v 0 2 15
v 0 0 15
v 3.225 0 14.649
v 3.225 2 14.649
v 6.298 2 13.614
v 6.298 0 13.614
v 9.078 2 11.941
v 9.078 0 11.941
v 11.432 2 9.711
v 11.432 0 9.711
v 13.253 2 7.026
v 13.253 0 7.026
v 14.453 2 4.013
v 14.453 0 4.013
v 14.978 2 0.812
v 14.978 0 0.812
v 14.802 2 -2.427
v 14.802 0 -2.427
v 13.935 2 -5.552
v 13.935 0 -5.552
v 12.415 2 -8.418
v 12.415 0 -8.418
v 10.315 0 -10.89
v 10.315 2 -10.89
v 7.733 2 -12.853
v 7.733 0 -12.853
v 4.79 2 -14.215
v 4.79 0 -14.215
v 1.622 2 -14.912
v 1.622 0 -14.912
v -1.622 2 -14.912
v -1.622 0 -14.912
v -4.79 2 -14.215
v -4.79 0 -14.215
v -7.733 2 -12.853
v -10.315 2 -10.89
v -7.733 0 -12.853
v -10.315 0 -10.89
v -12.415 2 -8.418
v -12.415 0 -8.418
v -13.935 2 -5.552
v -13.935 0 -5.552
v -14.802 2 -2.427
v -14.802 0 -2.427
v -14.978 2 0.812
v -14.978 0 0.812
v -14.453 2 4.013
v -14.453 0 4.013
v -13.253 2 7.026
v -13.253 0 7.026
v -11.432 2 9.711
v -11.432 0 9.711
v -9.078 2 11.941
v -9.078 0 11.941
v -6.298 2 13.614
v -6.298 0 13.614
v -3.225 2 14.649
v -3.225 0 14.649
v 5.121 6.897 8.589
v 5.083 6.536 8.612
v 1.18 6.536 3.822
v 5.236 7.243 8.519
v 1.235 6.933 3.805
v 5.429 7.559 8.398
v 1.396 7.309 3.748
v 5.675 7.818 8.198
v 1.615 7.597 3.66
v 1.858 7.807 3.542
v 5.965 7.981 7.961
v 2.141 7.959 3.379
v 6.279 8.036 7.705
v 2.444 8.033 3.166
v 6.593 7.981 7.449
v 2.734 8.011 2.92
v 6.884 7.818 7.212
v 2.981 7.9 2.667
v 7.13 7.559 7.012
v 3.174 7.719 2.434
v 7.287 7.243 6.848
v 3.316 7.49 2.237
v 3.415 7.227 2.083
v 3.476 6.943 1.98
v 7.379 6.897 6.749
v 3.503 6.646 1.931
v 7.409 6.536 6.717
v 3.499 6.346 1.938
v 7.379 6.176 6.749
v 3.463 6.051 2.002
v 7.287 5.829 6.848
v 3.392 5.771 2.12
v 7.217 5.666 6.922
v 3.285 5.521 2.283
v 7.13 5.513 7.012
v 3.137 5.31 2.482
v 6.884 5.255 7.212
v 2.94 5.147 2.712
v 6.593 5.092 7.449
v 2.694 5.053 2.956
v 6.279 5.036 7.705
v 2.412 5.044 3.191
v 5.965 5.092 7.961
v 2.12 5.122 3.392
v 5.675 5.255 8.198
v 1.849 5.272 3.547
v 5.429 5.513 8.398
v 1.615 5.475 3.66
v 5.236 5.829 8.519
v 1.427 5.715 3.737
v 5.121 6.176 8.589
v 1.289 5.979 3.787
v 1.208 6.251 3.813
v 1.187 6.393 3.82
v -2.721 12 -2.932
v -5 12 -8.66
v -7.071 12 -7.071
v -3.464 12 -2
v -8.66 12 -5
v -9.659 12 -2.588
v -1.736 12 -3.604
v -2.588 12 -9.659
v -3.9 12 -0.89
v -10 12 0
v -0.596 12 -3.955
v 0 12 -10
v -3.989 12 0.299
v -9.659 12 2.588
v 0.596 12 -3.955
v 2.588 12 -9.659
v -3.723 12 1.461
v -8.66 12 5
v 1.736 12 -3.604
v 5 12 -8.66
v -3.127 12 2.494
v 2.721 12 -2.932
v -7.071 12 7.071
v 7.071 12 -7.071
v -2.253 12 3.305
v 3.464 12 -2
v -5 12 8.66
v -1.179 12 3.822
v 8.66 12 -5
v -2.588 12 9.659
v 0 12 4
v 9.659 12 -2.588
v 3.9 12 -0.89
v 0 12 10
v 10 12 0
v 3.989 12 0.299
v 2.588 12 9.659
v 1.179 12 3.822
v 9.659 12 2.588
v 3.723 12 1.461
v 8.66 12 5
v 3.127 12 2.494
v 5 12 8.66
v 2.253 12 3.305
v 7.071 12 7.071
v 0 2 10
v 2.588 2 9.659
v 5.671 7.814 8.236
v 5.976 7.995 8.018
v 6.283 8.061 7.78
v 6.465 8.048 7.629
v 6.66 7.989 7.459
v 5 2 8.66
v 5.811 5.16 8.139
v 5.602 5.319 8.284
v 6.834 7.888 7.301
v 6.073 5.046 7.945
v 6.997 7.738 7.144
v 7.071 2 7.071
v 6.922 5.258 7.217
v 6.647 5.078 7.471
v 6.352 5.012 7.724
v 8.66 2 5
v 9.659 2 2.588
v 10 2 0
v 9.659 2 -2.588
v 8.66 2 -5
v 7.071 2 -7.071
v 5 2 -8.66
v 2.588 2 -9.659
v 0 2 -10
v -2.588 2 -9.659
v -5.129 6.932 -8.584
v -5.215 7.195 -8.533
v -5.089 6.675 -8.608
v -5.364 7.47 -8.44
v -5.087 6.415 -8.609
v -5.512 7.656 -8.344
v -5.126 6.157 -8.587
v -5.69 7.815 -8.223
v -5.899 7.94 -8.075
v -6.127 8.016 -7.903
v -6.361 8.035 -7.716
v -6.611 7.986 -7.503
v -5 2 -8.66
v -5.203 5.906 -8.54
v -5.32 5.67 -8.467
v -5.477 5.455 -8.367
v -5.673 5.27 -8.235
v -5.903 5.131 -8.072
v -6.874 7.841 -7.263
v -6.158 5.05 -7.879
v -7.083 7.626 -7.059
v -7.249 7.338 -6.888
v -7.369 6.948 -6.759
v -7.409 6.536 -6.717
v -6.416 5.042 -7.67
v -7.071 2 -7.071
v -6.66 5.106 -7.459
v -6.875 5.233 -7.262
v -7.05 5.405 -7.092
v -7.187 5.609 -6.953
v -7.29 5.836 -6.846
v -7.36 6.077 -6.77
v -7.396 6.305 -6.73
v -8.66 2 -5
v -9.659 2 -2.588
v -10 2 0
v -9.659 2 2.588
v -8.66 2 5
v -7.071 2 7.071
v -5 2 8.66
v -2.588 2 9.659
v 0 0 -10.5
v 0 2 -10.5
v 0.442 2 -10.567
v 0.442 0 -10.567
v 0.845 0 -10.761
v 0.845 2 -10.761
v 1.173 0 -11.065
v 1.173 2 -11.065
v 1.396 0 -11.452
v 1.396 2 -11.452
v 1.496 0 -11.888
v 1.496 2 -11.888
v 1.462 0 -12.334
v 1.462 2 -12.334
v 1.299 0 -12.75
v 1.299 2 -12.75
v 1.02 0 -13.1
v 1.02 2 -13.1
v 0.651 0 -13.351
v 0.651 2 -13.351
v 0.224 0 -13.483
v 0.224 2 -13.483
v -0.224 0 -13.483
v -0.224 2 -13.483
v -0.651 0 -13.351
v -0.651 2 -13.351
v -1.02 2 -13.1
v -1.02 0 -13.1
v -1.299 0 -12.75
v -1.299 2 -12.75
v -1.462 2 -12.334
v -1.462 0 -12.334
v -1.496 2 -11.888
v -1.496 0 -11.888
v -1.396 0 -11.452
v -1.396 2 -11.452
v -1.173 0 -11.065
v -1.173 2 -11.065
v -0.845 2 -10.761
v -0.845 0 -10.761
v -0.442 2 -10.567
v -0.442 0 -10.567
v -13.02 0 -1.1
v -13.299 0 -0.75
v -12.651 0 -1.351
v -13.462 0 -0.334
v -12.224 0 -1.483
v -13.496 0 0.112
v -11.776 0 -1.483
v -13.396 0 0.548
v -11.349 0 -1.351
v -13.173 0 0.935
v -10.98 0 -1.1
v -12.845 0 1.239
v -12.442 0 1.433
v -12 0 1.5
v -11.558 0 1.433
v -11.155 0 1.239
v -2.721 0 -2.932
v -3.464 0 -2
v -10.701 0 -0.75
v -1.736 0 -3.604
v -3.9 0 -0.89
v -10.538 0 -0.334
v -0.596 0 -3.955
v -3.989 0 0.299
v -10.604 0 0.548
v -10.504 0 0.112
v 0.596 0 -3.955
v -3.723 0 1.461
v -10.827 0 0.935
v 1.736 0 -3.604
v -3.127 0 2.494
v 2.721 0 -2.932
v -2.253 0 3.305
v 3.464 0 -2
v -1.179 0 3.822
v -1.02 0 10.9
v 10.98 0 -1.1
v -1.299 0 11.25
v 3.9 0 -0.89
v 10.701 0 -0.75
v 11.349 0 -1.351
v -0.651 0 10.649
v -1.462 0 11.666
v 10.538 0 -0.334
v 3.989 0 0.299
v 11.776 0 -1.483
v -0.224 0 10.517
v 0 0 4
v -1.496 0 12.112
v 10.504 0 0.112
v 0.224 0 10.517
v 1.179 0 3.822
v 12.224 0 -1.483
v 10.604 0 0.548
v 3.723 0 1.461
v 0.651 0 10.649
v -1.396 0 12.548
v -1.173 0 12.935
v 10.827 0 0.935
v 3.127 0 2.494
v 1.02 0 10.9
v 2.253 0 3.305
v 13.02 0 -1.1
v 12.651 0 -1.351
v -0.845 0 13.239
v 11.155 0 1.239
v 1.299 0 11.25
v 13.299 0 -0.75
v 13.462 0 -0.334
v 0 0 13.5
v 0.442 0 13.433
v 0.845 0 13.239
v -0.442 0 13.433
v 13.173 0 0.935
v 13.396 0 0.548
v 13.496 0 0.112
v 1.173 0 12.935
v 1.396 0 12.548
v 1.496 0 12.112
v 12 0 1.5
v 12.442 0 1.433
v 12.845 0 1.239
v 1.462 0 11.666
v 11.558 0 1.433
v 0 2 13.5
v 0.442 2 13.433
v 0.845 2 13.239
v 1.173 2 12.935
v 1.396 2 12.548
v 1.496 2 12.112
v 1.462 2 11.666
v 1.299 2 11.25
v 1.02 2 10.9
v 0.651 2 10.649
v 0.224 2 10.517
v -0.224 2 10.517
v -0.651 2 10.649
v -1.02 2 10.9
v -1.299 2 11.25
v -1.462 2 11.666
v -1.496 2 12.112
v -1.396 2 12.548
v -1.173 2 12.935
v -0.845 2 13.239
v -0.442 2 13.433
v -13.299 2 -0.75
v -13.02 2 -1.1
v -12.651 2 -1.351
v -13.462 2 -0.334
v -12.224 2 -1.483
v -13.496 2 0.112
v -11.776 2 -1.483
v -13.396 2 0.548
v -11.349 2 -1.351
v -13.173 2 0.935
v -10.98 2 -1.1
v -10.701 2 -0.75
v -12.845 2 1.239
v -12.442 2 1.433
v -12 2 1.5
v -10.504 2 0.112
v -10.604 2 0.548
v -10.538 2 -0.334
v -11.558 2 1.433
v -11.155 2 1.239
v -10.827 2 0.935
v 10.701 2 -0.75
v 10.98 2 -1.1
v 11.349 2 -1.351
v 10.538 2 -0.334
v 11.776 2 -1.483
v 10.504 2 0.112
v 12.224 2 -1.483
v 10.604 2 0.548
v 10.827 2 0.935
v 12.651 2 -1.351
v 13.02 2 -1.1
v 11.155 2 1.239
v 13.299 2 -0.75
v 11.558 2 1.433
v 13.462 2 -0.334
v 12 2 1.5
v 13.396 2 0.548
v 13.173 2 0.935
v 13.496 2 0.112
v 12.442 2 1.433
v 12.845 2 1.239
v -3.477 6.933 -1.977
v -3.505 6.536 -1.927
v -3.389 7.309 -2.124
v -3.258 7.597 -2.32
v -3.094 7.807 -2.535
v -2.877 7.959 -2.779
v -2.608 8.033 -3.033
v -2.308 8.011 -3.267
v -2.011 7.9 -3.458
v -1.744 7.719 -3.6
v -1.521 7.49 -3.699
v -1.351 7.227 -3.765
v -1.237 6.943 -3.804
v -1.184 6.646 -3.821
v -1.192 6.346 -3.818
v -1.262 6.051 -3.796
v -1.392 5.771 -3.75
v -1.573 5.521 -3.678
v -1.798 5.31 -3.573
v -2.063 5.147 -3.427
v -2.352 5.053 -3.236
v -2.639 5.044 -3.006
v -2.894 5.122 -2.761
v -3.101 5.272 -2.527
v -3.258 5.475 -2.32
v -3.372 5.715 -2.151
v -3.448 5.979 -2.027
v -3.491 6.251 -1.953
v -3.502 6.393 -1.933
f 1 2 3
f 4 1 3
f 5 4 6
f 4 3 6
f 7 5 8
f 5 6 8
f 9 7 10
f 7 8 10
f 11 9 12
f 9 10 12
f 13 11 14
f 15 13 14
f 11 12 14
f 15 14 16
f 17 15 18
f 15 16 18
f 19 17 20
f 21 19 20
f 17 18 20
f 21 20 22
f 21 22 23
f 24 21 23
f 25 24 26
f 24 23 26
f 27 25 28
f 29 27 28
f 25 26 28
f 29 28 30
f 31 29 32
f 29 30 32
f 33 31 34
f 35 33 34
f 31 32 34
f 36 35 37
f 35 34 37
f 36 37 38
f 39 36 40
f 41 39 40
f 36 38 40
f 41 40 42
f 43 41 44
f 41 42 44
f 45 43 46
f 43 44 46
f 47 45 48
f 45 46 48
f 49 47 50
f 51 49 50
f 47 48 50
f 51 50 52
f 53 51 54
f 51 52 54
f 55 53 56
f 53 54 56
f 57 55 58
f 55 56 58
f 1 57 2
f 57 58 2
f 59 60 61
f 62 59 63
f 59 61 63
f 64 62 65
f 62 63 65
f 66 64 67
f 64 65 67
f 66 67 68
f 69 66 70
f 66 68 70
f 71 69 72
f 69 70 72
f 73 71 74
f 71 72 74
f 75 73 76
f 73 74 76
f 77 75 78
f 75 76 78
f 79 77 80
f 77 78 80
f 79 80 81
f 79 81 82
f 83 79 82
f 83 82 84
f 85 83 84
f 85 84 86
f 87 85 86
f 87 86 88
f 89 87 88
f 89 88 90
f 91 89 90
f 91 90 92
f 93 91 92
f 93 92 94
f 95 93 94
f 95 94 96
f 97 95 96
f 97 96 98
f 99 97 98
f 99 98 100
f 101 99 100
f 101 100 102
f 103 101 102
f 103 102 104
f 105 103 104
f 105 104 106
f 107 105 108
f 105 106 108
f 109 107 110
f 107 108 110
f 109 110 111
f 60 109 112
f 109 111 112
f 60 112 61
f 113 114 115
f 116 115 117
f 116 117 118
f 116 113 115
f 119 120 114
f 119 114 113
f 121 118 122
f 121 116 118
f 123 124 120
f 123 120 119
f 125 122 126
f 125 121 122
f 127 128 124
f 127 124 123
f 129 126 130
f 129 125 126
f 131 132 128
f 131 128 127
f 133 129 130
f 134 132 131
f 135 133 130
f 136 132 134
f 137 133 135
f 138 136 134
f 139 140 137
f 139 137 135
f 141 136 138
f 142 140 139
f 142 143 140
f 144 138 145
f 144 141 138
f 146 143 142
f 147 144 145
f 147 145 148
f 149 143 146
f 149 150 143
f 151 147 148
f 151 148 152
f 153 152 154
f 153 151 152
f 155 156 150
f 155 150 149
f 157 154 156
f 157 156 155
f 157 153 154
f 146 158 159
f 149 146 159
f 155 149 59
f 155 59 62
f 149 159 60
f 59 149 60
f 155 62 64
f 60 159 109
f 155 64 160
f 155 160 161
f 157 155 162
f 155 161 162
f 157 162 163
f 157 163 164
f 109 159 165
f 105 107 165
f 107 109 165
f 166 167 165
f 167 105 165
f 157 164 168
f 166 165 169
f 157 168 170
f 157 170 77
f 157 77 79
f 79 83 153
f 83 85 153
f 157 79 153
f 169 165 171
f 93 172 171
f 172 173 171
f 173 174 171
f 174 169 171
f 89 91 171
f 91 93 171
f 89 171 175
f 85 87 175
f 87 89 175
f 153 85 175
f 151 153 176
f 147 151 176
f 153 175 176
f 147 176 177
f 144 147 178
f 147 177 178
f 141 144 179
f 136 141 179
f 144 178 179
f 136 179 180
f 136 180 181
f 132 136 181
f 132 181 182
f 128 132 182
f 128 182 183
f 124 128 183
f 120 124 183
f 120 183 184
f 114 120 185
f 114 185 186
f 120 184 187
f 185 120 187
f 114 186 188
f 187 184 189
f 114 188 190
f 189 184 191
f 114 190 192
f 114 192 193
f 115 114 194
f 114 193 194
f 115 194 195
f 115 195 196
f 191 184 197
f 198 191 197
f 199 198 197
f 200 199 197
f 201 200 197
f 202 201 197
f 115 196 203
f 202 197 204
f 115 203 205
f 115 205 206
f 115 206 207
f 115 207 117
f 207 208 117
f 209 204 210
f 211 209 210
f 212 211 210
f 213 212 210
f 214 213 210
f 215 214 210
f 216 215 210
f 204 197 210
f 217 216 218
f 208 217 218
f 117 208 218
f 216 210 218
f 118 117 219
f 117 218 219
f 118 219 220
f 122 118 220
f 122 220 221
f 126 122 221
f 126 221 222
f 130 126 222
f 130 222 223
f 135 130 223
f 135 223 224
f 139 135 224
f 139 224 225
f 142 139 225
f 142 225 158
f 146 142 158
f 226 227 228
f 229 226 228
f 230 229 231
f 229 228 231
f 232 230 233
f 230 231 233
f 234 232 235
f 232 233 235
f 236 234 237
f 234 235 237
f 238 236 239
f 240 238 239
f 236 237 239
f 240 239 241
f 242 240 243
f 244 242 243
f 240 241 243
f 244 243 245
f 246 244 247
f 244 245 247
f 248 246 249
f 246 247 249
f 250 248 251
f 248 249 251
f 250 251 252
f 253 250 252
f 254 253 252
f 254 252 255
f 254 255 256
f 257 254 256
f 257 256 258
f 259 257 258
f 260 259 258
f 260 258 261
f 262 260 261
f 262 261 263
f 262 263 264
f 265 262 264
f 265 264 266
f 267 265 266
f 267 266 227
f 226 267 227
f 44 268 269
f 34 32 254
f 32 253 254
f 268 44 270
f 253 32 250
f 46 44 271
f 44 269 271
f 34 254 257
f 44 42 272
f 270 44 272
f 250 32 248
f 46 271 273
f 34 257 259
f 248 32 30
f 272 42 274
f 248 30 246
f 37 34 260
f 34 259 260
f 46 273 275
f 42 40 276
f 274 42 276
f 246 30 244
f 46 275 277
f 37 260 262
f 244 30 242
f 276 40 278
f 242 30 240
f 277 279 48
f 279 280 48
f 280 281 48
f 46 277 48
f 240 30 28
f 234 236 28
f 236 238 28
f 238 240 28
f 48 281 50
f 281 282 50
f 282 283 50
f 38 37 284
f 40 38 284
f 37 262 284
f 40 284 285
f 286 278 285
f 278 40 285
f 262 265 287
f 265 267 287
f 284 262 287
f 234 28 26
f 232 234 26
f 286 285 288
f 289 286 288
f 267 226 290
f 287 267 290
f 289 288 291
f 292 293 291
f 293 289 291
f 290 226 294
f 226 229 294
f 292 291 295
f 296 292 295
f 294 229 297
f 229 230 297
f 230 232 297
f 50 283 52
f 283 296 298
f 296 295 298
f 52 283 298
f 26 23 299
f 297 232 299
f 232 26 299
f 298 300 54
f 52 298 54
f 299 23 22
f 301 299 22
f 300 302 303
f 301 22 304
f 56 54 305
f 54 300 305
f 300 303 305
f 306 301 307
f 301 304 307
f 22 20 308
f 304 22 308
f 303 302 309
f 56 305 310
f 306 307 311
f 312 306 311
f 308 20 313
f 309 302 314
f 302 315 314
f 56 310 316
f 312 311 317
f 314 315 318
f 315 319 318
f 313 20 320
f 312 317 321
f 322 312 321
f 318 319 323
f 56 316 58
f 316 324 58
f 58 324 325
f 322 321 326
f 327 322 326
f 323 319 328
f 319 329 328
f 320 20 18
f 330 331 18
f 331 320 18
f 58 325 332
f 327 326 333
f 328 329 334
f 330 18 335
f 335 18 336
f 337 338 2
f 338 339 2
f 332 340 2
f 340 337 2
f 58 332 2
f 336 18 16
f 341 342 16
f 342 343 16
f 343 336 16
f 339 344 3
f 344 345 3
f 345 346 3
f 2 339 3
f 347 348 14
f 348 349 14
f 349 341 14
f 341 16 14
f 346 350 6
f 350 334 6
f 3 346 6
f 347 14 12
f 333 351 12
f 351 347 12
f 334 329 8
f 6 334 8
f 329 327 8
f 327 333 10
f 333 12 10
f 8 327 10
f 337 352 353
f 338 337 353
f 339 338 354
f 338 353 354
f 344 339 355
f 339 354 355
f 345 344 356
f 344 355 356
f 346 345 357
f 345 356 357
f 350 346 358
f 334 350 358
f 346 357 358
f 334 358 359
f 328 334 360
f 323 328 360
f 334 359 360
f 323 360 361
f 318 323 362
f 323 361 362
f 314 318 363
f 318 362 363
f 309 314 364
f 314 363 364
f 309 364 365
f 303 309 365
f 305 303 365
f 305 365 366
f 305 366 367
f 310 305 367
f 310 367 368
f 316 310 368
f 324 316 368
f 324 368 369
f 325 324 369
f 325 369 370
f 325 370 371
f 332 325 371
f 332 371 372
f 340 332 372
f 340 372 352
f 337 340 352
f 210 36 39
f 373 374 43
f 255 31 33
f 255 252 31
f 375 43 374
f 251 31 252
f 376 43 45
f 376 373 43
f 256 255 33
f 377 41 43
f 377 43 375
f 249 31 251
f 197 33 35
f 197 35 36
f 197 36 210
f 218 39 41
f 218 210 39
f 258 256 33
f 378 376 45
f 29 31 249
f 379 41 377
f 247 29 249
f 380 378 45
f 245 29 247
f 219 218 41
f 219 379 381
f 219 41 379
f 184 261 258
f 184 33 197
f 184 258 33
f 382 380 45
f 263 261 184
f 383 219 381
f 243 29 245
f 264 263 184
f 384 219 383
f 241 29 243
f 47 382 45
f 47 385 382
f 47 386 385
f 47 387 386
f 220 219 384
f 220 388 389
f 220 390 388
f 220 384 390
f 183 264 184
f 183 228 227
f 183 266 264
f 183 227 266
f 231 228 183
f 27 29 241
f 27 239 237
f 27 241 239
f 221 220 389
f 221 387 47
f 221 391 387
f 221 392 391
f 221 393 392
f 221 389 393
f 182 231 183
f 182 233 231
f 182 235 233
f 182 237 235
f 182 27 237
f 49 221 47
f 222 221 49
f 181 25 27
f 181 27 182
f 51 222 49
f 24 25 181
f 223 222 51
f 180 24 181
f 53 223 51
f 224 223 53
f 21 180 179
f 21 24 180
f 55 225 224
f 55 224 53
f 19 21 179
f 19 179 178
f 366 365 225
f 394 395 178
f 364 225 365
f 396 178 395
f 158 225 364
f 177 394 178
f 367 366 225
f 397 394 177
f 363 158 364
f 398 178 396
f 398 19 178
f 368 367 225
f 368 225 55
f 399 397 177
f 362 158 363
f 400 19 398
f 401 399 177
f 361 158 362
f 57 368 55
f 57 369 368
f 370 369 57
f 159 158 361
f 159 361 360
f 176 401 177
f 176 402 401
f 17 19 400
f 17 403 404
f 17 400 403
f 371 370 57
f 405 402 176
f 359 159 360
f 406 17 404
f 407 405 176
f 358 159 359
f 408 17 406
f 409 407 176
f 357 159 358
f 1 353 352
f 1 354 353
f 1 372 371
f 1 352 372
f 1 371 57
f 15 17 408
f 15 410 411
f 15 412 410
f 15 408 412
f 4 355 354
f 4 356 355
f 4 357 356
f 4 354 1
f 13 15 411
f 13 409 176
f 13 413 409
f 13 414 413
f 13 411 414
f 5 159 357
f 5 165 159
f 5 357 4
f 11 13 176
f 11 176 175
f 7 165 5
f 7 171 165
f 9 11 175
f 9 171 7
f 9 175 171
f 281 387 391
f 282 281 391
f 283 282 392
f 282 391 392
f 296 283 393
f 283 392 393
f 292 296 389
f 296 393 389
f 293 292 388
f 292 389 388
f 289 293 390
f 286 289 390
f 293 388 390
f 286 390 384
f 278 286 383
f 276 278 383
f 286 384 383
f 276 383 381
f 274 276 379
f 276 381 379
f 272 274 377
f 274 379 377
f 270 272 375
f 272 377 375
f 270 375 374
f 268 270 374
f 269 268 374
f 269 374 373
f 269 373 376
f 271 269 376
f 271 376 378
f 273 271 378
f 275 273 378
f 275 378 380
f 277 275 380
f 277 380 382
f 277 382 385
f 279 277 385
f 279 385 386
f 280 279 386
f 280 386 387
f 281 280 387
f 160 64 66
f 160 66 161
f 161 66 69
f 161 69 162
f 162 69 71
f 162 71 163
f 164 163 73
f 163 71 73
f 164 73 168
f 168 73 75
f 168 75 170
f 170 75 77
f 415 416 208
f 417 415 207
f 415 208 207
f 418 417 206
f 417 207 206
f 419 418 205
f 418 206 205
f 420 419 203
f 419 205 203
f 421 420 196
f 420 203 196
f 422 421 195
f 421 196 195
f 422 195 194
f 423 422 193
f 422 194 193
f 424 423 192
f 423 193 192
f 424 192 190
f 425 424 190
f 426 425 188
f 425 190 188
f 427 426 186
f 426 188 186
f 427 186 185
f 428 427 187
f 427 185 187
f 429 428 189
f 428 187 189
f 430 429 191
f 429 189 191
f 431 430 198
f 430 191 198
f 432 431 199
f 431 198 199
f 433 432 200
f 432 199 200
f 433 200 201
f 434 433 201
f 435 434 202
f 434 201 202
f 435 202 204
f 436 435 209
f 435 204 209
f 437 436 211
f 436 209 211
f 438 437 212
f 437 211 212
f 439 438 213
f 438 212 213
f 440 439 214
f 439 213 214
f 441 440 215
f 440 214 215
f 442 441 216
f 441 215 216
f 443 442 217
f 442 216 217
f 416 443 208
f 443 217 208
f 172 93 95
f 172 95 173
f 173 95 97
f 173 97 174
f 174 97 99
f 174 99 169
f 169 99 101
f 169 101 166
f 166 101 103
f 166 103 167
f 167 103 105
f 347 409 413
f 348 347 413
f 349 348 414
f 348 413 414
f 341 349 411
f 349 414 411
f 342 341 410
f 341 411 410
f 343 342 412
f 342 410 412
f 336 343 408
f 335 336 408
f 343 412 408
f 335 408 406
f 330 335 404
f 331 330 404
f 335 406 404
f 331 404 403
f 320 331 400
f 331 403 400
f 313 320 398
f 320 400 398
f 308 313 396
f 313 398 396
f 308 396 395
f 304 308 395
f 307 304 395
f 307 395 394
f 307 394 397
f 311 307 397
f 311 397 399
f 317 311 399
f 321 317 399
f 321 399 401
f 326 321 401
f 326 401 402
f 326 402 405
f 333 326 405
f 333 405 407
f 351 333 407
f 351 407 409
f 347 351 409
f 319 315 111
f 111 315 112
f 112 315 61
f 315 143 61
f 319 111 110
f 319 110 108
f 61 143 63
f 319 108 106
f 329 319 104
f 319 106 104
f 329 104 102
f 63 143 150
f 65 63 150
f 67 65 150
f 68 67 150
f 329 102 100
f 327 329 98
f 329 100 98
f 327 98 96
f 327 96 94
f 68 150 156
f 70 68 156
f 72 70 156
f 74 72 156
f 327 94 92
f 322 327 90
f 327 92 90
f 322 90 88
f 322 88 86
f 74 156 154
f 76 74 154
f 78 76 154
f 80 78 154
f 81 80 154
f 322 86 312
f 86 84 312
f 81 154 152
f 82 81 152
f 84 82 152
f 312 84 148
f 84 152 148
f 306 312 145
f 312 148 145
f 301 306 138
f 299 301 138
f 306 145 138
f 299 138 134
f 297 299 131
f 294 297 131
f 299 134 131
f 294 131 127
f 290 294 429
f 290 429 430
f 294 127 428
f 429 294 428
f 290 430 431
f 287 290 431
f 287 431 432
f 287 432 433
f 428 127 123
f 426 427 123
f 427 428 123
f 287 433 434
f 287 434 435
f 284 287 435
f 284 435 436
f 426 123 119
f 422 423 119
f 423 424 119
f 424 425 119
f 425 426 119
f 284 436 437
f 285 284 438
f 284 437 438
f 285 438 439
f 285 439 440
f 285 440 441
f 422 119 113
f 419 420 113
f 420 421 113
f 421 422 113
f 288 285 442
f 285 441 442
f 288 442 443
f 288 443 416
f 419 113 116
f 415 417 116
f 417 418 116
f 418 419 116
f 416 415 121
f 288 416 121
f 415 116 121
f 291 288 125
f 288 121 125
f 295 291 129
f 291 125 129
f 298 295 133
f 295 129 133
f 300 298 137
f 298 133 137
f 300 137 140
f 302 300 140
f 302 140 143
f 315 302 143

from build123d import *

# Parameters (mm, degrees)
SKETCH1_R                          = 15
BOSS_EXTRUDE1_DEPTH                = 2
SKETCH2_R                          = 10
BOSS_EXTRUDE2_DEPTH                = 10
SKETCH3_R                          = 4
CUT_EXTRUDE1_DEPTH                 = 25.372115214
SKETCH4_R                          = 1.5
CUT_EXTRUDE2_DEPTH                 = 10
F_3_0_3_DIAMETER_HOLE2_D           = 3
F_3_0_3_DIAMETER_HOLE2_CSINK_D     = 3.05
F_3_0_3_DIAMETER_HOLE2_CSINK_ANGLE = 45


with BuildPart() as part:
    # Sketch1 → Boss-Extrude1 (new body)
    with BuildSketch(Plane(origin=(0, 0, 0), x_dir=(1, 0, 0), z_dir=(0, 1, 0))):
        with Locations(Location((0, 0, 0), (0, 0, 270))):
            Circle(SKETCH1_R)
    extrude(amount=BOSS_EXTRUDE1_DEPTH)

    # Sketch2 → Boss-Extrude2 (add)
    with BuildSketch(Plane(origin=(0, 2, 0), x_dir=(1, 0, 0), z_dir=(0, 1, 0))):
        with Locations(Location((0, 0, 0), (0, 0, 270))):
            Circle(SKETCH2_R)
    extrude(amount=BOSS_EXTRUDE2_DEPTH)

    # Sketch3 → Cut-Extrude1 (cut, through all)
    with BuildSketch(Plane(origin=(0, 12, 0), x_dir=(1, 0, 0), z_dir=(0, 1, 0))):
        with Locations(Location((0, 0, 0), (0, 0, 270))):
            Circle(SKETCH3_R)
    extrude(amount=-CUT_EXTRUDE1_DEPTH, mode=Mode.SUBTRACT)

    # Sketch4 → Cut-Extrude2 (cut)
    with BuildSketch(Plane(origin=(0, 2, 0), x_dir=(1, 0, 0), z_dir=(0, 1, 0))):
        with Locations(Location((-12, 0, 0), (0, 0, 270))):
            Circle(SKETCH4_R)
        with Locations(Location((0, 12, 0), (0, 0, 270))):
            Circle(SKETCH4_R)
        with Locations(Location((12, 0, 0), (0, 0, 270))):
            Circle(SKETCH4_R)
        with Locations(Location((0, -12, 0), (0, 0, 270))):
            Circle(SKETCH4_R)
    extrude(amount=-CUT_EXTRUDE2_DEPTH, mode=Mode.SUBTRACT)

    # Ø3.0 (3) Diameter Hole2 (through all)
    with Locations(Plane(origin=(6.317328185, 6.536355403, 7.751862009), x_dir=(0.775186200902, 0, -0.631732818469), z_dir=(0.631732818469, 0, 0.775186200902))):
        with Locations((0, 0)):
            CounterSinkHole(F_3_0_3_DIAMETER_HOLE2_D / 2, F_3_0_3_DIAMETER_HOLE2_CSINK_D / 2, counter_sink_angle=F_3_0_3_DIAMETER_HOLE2_CSINK_ANGLE)


solid = part.part
